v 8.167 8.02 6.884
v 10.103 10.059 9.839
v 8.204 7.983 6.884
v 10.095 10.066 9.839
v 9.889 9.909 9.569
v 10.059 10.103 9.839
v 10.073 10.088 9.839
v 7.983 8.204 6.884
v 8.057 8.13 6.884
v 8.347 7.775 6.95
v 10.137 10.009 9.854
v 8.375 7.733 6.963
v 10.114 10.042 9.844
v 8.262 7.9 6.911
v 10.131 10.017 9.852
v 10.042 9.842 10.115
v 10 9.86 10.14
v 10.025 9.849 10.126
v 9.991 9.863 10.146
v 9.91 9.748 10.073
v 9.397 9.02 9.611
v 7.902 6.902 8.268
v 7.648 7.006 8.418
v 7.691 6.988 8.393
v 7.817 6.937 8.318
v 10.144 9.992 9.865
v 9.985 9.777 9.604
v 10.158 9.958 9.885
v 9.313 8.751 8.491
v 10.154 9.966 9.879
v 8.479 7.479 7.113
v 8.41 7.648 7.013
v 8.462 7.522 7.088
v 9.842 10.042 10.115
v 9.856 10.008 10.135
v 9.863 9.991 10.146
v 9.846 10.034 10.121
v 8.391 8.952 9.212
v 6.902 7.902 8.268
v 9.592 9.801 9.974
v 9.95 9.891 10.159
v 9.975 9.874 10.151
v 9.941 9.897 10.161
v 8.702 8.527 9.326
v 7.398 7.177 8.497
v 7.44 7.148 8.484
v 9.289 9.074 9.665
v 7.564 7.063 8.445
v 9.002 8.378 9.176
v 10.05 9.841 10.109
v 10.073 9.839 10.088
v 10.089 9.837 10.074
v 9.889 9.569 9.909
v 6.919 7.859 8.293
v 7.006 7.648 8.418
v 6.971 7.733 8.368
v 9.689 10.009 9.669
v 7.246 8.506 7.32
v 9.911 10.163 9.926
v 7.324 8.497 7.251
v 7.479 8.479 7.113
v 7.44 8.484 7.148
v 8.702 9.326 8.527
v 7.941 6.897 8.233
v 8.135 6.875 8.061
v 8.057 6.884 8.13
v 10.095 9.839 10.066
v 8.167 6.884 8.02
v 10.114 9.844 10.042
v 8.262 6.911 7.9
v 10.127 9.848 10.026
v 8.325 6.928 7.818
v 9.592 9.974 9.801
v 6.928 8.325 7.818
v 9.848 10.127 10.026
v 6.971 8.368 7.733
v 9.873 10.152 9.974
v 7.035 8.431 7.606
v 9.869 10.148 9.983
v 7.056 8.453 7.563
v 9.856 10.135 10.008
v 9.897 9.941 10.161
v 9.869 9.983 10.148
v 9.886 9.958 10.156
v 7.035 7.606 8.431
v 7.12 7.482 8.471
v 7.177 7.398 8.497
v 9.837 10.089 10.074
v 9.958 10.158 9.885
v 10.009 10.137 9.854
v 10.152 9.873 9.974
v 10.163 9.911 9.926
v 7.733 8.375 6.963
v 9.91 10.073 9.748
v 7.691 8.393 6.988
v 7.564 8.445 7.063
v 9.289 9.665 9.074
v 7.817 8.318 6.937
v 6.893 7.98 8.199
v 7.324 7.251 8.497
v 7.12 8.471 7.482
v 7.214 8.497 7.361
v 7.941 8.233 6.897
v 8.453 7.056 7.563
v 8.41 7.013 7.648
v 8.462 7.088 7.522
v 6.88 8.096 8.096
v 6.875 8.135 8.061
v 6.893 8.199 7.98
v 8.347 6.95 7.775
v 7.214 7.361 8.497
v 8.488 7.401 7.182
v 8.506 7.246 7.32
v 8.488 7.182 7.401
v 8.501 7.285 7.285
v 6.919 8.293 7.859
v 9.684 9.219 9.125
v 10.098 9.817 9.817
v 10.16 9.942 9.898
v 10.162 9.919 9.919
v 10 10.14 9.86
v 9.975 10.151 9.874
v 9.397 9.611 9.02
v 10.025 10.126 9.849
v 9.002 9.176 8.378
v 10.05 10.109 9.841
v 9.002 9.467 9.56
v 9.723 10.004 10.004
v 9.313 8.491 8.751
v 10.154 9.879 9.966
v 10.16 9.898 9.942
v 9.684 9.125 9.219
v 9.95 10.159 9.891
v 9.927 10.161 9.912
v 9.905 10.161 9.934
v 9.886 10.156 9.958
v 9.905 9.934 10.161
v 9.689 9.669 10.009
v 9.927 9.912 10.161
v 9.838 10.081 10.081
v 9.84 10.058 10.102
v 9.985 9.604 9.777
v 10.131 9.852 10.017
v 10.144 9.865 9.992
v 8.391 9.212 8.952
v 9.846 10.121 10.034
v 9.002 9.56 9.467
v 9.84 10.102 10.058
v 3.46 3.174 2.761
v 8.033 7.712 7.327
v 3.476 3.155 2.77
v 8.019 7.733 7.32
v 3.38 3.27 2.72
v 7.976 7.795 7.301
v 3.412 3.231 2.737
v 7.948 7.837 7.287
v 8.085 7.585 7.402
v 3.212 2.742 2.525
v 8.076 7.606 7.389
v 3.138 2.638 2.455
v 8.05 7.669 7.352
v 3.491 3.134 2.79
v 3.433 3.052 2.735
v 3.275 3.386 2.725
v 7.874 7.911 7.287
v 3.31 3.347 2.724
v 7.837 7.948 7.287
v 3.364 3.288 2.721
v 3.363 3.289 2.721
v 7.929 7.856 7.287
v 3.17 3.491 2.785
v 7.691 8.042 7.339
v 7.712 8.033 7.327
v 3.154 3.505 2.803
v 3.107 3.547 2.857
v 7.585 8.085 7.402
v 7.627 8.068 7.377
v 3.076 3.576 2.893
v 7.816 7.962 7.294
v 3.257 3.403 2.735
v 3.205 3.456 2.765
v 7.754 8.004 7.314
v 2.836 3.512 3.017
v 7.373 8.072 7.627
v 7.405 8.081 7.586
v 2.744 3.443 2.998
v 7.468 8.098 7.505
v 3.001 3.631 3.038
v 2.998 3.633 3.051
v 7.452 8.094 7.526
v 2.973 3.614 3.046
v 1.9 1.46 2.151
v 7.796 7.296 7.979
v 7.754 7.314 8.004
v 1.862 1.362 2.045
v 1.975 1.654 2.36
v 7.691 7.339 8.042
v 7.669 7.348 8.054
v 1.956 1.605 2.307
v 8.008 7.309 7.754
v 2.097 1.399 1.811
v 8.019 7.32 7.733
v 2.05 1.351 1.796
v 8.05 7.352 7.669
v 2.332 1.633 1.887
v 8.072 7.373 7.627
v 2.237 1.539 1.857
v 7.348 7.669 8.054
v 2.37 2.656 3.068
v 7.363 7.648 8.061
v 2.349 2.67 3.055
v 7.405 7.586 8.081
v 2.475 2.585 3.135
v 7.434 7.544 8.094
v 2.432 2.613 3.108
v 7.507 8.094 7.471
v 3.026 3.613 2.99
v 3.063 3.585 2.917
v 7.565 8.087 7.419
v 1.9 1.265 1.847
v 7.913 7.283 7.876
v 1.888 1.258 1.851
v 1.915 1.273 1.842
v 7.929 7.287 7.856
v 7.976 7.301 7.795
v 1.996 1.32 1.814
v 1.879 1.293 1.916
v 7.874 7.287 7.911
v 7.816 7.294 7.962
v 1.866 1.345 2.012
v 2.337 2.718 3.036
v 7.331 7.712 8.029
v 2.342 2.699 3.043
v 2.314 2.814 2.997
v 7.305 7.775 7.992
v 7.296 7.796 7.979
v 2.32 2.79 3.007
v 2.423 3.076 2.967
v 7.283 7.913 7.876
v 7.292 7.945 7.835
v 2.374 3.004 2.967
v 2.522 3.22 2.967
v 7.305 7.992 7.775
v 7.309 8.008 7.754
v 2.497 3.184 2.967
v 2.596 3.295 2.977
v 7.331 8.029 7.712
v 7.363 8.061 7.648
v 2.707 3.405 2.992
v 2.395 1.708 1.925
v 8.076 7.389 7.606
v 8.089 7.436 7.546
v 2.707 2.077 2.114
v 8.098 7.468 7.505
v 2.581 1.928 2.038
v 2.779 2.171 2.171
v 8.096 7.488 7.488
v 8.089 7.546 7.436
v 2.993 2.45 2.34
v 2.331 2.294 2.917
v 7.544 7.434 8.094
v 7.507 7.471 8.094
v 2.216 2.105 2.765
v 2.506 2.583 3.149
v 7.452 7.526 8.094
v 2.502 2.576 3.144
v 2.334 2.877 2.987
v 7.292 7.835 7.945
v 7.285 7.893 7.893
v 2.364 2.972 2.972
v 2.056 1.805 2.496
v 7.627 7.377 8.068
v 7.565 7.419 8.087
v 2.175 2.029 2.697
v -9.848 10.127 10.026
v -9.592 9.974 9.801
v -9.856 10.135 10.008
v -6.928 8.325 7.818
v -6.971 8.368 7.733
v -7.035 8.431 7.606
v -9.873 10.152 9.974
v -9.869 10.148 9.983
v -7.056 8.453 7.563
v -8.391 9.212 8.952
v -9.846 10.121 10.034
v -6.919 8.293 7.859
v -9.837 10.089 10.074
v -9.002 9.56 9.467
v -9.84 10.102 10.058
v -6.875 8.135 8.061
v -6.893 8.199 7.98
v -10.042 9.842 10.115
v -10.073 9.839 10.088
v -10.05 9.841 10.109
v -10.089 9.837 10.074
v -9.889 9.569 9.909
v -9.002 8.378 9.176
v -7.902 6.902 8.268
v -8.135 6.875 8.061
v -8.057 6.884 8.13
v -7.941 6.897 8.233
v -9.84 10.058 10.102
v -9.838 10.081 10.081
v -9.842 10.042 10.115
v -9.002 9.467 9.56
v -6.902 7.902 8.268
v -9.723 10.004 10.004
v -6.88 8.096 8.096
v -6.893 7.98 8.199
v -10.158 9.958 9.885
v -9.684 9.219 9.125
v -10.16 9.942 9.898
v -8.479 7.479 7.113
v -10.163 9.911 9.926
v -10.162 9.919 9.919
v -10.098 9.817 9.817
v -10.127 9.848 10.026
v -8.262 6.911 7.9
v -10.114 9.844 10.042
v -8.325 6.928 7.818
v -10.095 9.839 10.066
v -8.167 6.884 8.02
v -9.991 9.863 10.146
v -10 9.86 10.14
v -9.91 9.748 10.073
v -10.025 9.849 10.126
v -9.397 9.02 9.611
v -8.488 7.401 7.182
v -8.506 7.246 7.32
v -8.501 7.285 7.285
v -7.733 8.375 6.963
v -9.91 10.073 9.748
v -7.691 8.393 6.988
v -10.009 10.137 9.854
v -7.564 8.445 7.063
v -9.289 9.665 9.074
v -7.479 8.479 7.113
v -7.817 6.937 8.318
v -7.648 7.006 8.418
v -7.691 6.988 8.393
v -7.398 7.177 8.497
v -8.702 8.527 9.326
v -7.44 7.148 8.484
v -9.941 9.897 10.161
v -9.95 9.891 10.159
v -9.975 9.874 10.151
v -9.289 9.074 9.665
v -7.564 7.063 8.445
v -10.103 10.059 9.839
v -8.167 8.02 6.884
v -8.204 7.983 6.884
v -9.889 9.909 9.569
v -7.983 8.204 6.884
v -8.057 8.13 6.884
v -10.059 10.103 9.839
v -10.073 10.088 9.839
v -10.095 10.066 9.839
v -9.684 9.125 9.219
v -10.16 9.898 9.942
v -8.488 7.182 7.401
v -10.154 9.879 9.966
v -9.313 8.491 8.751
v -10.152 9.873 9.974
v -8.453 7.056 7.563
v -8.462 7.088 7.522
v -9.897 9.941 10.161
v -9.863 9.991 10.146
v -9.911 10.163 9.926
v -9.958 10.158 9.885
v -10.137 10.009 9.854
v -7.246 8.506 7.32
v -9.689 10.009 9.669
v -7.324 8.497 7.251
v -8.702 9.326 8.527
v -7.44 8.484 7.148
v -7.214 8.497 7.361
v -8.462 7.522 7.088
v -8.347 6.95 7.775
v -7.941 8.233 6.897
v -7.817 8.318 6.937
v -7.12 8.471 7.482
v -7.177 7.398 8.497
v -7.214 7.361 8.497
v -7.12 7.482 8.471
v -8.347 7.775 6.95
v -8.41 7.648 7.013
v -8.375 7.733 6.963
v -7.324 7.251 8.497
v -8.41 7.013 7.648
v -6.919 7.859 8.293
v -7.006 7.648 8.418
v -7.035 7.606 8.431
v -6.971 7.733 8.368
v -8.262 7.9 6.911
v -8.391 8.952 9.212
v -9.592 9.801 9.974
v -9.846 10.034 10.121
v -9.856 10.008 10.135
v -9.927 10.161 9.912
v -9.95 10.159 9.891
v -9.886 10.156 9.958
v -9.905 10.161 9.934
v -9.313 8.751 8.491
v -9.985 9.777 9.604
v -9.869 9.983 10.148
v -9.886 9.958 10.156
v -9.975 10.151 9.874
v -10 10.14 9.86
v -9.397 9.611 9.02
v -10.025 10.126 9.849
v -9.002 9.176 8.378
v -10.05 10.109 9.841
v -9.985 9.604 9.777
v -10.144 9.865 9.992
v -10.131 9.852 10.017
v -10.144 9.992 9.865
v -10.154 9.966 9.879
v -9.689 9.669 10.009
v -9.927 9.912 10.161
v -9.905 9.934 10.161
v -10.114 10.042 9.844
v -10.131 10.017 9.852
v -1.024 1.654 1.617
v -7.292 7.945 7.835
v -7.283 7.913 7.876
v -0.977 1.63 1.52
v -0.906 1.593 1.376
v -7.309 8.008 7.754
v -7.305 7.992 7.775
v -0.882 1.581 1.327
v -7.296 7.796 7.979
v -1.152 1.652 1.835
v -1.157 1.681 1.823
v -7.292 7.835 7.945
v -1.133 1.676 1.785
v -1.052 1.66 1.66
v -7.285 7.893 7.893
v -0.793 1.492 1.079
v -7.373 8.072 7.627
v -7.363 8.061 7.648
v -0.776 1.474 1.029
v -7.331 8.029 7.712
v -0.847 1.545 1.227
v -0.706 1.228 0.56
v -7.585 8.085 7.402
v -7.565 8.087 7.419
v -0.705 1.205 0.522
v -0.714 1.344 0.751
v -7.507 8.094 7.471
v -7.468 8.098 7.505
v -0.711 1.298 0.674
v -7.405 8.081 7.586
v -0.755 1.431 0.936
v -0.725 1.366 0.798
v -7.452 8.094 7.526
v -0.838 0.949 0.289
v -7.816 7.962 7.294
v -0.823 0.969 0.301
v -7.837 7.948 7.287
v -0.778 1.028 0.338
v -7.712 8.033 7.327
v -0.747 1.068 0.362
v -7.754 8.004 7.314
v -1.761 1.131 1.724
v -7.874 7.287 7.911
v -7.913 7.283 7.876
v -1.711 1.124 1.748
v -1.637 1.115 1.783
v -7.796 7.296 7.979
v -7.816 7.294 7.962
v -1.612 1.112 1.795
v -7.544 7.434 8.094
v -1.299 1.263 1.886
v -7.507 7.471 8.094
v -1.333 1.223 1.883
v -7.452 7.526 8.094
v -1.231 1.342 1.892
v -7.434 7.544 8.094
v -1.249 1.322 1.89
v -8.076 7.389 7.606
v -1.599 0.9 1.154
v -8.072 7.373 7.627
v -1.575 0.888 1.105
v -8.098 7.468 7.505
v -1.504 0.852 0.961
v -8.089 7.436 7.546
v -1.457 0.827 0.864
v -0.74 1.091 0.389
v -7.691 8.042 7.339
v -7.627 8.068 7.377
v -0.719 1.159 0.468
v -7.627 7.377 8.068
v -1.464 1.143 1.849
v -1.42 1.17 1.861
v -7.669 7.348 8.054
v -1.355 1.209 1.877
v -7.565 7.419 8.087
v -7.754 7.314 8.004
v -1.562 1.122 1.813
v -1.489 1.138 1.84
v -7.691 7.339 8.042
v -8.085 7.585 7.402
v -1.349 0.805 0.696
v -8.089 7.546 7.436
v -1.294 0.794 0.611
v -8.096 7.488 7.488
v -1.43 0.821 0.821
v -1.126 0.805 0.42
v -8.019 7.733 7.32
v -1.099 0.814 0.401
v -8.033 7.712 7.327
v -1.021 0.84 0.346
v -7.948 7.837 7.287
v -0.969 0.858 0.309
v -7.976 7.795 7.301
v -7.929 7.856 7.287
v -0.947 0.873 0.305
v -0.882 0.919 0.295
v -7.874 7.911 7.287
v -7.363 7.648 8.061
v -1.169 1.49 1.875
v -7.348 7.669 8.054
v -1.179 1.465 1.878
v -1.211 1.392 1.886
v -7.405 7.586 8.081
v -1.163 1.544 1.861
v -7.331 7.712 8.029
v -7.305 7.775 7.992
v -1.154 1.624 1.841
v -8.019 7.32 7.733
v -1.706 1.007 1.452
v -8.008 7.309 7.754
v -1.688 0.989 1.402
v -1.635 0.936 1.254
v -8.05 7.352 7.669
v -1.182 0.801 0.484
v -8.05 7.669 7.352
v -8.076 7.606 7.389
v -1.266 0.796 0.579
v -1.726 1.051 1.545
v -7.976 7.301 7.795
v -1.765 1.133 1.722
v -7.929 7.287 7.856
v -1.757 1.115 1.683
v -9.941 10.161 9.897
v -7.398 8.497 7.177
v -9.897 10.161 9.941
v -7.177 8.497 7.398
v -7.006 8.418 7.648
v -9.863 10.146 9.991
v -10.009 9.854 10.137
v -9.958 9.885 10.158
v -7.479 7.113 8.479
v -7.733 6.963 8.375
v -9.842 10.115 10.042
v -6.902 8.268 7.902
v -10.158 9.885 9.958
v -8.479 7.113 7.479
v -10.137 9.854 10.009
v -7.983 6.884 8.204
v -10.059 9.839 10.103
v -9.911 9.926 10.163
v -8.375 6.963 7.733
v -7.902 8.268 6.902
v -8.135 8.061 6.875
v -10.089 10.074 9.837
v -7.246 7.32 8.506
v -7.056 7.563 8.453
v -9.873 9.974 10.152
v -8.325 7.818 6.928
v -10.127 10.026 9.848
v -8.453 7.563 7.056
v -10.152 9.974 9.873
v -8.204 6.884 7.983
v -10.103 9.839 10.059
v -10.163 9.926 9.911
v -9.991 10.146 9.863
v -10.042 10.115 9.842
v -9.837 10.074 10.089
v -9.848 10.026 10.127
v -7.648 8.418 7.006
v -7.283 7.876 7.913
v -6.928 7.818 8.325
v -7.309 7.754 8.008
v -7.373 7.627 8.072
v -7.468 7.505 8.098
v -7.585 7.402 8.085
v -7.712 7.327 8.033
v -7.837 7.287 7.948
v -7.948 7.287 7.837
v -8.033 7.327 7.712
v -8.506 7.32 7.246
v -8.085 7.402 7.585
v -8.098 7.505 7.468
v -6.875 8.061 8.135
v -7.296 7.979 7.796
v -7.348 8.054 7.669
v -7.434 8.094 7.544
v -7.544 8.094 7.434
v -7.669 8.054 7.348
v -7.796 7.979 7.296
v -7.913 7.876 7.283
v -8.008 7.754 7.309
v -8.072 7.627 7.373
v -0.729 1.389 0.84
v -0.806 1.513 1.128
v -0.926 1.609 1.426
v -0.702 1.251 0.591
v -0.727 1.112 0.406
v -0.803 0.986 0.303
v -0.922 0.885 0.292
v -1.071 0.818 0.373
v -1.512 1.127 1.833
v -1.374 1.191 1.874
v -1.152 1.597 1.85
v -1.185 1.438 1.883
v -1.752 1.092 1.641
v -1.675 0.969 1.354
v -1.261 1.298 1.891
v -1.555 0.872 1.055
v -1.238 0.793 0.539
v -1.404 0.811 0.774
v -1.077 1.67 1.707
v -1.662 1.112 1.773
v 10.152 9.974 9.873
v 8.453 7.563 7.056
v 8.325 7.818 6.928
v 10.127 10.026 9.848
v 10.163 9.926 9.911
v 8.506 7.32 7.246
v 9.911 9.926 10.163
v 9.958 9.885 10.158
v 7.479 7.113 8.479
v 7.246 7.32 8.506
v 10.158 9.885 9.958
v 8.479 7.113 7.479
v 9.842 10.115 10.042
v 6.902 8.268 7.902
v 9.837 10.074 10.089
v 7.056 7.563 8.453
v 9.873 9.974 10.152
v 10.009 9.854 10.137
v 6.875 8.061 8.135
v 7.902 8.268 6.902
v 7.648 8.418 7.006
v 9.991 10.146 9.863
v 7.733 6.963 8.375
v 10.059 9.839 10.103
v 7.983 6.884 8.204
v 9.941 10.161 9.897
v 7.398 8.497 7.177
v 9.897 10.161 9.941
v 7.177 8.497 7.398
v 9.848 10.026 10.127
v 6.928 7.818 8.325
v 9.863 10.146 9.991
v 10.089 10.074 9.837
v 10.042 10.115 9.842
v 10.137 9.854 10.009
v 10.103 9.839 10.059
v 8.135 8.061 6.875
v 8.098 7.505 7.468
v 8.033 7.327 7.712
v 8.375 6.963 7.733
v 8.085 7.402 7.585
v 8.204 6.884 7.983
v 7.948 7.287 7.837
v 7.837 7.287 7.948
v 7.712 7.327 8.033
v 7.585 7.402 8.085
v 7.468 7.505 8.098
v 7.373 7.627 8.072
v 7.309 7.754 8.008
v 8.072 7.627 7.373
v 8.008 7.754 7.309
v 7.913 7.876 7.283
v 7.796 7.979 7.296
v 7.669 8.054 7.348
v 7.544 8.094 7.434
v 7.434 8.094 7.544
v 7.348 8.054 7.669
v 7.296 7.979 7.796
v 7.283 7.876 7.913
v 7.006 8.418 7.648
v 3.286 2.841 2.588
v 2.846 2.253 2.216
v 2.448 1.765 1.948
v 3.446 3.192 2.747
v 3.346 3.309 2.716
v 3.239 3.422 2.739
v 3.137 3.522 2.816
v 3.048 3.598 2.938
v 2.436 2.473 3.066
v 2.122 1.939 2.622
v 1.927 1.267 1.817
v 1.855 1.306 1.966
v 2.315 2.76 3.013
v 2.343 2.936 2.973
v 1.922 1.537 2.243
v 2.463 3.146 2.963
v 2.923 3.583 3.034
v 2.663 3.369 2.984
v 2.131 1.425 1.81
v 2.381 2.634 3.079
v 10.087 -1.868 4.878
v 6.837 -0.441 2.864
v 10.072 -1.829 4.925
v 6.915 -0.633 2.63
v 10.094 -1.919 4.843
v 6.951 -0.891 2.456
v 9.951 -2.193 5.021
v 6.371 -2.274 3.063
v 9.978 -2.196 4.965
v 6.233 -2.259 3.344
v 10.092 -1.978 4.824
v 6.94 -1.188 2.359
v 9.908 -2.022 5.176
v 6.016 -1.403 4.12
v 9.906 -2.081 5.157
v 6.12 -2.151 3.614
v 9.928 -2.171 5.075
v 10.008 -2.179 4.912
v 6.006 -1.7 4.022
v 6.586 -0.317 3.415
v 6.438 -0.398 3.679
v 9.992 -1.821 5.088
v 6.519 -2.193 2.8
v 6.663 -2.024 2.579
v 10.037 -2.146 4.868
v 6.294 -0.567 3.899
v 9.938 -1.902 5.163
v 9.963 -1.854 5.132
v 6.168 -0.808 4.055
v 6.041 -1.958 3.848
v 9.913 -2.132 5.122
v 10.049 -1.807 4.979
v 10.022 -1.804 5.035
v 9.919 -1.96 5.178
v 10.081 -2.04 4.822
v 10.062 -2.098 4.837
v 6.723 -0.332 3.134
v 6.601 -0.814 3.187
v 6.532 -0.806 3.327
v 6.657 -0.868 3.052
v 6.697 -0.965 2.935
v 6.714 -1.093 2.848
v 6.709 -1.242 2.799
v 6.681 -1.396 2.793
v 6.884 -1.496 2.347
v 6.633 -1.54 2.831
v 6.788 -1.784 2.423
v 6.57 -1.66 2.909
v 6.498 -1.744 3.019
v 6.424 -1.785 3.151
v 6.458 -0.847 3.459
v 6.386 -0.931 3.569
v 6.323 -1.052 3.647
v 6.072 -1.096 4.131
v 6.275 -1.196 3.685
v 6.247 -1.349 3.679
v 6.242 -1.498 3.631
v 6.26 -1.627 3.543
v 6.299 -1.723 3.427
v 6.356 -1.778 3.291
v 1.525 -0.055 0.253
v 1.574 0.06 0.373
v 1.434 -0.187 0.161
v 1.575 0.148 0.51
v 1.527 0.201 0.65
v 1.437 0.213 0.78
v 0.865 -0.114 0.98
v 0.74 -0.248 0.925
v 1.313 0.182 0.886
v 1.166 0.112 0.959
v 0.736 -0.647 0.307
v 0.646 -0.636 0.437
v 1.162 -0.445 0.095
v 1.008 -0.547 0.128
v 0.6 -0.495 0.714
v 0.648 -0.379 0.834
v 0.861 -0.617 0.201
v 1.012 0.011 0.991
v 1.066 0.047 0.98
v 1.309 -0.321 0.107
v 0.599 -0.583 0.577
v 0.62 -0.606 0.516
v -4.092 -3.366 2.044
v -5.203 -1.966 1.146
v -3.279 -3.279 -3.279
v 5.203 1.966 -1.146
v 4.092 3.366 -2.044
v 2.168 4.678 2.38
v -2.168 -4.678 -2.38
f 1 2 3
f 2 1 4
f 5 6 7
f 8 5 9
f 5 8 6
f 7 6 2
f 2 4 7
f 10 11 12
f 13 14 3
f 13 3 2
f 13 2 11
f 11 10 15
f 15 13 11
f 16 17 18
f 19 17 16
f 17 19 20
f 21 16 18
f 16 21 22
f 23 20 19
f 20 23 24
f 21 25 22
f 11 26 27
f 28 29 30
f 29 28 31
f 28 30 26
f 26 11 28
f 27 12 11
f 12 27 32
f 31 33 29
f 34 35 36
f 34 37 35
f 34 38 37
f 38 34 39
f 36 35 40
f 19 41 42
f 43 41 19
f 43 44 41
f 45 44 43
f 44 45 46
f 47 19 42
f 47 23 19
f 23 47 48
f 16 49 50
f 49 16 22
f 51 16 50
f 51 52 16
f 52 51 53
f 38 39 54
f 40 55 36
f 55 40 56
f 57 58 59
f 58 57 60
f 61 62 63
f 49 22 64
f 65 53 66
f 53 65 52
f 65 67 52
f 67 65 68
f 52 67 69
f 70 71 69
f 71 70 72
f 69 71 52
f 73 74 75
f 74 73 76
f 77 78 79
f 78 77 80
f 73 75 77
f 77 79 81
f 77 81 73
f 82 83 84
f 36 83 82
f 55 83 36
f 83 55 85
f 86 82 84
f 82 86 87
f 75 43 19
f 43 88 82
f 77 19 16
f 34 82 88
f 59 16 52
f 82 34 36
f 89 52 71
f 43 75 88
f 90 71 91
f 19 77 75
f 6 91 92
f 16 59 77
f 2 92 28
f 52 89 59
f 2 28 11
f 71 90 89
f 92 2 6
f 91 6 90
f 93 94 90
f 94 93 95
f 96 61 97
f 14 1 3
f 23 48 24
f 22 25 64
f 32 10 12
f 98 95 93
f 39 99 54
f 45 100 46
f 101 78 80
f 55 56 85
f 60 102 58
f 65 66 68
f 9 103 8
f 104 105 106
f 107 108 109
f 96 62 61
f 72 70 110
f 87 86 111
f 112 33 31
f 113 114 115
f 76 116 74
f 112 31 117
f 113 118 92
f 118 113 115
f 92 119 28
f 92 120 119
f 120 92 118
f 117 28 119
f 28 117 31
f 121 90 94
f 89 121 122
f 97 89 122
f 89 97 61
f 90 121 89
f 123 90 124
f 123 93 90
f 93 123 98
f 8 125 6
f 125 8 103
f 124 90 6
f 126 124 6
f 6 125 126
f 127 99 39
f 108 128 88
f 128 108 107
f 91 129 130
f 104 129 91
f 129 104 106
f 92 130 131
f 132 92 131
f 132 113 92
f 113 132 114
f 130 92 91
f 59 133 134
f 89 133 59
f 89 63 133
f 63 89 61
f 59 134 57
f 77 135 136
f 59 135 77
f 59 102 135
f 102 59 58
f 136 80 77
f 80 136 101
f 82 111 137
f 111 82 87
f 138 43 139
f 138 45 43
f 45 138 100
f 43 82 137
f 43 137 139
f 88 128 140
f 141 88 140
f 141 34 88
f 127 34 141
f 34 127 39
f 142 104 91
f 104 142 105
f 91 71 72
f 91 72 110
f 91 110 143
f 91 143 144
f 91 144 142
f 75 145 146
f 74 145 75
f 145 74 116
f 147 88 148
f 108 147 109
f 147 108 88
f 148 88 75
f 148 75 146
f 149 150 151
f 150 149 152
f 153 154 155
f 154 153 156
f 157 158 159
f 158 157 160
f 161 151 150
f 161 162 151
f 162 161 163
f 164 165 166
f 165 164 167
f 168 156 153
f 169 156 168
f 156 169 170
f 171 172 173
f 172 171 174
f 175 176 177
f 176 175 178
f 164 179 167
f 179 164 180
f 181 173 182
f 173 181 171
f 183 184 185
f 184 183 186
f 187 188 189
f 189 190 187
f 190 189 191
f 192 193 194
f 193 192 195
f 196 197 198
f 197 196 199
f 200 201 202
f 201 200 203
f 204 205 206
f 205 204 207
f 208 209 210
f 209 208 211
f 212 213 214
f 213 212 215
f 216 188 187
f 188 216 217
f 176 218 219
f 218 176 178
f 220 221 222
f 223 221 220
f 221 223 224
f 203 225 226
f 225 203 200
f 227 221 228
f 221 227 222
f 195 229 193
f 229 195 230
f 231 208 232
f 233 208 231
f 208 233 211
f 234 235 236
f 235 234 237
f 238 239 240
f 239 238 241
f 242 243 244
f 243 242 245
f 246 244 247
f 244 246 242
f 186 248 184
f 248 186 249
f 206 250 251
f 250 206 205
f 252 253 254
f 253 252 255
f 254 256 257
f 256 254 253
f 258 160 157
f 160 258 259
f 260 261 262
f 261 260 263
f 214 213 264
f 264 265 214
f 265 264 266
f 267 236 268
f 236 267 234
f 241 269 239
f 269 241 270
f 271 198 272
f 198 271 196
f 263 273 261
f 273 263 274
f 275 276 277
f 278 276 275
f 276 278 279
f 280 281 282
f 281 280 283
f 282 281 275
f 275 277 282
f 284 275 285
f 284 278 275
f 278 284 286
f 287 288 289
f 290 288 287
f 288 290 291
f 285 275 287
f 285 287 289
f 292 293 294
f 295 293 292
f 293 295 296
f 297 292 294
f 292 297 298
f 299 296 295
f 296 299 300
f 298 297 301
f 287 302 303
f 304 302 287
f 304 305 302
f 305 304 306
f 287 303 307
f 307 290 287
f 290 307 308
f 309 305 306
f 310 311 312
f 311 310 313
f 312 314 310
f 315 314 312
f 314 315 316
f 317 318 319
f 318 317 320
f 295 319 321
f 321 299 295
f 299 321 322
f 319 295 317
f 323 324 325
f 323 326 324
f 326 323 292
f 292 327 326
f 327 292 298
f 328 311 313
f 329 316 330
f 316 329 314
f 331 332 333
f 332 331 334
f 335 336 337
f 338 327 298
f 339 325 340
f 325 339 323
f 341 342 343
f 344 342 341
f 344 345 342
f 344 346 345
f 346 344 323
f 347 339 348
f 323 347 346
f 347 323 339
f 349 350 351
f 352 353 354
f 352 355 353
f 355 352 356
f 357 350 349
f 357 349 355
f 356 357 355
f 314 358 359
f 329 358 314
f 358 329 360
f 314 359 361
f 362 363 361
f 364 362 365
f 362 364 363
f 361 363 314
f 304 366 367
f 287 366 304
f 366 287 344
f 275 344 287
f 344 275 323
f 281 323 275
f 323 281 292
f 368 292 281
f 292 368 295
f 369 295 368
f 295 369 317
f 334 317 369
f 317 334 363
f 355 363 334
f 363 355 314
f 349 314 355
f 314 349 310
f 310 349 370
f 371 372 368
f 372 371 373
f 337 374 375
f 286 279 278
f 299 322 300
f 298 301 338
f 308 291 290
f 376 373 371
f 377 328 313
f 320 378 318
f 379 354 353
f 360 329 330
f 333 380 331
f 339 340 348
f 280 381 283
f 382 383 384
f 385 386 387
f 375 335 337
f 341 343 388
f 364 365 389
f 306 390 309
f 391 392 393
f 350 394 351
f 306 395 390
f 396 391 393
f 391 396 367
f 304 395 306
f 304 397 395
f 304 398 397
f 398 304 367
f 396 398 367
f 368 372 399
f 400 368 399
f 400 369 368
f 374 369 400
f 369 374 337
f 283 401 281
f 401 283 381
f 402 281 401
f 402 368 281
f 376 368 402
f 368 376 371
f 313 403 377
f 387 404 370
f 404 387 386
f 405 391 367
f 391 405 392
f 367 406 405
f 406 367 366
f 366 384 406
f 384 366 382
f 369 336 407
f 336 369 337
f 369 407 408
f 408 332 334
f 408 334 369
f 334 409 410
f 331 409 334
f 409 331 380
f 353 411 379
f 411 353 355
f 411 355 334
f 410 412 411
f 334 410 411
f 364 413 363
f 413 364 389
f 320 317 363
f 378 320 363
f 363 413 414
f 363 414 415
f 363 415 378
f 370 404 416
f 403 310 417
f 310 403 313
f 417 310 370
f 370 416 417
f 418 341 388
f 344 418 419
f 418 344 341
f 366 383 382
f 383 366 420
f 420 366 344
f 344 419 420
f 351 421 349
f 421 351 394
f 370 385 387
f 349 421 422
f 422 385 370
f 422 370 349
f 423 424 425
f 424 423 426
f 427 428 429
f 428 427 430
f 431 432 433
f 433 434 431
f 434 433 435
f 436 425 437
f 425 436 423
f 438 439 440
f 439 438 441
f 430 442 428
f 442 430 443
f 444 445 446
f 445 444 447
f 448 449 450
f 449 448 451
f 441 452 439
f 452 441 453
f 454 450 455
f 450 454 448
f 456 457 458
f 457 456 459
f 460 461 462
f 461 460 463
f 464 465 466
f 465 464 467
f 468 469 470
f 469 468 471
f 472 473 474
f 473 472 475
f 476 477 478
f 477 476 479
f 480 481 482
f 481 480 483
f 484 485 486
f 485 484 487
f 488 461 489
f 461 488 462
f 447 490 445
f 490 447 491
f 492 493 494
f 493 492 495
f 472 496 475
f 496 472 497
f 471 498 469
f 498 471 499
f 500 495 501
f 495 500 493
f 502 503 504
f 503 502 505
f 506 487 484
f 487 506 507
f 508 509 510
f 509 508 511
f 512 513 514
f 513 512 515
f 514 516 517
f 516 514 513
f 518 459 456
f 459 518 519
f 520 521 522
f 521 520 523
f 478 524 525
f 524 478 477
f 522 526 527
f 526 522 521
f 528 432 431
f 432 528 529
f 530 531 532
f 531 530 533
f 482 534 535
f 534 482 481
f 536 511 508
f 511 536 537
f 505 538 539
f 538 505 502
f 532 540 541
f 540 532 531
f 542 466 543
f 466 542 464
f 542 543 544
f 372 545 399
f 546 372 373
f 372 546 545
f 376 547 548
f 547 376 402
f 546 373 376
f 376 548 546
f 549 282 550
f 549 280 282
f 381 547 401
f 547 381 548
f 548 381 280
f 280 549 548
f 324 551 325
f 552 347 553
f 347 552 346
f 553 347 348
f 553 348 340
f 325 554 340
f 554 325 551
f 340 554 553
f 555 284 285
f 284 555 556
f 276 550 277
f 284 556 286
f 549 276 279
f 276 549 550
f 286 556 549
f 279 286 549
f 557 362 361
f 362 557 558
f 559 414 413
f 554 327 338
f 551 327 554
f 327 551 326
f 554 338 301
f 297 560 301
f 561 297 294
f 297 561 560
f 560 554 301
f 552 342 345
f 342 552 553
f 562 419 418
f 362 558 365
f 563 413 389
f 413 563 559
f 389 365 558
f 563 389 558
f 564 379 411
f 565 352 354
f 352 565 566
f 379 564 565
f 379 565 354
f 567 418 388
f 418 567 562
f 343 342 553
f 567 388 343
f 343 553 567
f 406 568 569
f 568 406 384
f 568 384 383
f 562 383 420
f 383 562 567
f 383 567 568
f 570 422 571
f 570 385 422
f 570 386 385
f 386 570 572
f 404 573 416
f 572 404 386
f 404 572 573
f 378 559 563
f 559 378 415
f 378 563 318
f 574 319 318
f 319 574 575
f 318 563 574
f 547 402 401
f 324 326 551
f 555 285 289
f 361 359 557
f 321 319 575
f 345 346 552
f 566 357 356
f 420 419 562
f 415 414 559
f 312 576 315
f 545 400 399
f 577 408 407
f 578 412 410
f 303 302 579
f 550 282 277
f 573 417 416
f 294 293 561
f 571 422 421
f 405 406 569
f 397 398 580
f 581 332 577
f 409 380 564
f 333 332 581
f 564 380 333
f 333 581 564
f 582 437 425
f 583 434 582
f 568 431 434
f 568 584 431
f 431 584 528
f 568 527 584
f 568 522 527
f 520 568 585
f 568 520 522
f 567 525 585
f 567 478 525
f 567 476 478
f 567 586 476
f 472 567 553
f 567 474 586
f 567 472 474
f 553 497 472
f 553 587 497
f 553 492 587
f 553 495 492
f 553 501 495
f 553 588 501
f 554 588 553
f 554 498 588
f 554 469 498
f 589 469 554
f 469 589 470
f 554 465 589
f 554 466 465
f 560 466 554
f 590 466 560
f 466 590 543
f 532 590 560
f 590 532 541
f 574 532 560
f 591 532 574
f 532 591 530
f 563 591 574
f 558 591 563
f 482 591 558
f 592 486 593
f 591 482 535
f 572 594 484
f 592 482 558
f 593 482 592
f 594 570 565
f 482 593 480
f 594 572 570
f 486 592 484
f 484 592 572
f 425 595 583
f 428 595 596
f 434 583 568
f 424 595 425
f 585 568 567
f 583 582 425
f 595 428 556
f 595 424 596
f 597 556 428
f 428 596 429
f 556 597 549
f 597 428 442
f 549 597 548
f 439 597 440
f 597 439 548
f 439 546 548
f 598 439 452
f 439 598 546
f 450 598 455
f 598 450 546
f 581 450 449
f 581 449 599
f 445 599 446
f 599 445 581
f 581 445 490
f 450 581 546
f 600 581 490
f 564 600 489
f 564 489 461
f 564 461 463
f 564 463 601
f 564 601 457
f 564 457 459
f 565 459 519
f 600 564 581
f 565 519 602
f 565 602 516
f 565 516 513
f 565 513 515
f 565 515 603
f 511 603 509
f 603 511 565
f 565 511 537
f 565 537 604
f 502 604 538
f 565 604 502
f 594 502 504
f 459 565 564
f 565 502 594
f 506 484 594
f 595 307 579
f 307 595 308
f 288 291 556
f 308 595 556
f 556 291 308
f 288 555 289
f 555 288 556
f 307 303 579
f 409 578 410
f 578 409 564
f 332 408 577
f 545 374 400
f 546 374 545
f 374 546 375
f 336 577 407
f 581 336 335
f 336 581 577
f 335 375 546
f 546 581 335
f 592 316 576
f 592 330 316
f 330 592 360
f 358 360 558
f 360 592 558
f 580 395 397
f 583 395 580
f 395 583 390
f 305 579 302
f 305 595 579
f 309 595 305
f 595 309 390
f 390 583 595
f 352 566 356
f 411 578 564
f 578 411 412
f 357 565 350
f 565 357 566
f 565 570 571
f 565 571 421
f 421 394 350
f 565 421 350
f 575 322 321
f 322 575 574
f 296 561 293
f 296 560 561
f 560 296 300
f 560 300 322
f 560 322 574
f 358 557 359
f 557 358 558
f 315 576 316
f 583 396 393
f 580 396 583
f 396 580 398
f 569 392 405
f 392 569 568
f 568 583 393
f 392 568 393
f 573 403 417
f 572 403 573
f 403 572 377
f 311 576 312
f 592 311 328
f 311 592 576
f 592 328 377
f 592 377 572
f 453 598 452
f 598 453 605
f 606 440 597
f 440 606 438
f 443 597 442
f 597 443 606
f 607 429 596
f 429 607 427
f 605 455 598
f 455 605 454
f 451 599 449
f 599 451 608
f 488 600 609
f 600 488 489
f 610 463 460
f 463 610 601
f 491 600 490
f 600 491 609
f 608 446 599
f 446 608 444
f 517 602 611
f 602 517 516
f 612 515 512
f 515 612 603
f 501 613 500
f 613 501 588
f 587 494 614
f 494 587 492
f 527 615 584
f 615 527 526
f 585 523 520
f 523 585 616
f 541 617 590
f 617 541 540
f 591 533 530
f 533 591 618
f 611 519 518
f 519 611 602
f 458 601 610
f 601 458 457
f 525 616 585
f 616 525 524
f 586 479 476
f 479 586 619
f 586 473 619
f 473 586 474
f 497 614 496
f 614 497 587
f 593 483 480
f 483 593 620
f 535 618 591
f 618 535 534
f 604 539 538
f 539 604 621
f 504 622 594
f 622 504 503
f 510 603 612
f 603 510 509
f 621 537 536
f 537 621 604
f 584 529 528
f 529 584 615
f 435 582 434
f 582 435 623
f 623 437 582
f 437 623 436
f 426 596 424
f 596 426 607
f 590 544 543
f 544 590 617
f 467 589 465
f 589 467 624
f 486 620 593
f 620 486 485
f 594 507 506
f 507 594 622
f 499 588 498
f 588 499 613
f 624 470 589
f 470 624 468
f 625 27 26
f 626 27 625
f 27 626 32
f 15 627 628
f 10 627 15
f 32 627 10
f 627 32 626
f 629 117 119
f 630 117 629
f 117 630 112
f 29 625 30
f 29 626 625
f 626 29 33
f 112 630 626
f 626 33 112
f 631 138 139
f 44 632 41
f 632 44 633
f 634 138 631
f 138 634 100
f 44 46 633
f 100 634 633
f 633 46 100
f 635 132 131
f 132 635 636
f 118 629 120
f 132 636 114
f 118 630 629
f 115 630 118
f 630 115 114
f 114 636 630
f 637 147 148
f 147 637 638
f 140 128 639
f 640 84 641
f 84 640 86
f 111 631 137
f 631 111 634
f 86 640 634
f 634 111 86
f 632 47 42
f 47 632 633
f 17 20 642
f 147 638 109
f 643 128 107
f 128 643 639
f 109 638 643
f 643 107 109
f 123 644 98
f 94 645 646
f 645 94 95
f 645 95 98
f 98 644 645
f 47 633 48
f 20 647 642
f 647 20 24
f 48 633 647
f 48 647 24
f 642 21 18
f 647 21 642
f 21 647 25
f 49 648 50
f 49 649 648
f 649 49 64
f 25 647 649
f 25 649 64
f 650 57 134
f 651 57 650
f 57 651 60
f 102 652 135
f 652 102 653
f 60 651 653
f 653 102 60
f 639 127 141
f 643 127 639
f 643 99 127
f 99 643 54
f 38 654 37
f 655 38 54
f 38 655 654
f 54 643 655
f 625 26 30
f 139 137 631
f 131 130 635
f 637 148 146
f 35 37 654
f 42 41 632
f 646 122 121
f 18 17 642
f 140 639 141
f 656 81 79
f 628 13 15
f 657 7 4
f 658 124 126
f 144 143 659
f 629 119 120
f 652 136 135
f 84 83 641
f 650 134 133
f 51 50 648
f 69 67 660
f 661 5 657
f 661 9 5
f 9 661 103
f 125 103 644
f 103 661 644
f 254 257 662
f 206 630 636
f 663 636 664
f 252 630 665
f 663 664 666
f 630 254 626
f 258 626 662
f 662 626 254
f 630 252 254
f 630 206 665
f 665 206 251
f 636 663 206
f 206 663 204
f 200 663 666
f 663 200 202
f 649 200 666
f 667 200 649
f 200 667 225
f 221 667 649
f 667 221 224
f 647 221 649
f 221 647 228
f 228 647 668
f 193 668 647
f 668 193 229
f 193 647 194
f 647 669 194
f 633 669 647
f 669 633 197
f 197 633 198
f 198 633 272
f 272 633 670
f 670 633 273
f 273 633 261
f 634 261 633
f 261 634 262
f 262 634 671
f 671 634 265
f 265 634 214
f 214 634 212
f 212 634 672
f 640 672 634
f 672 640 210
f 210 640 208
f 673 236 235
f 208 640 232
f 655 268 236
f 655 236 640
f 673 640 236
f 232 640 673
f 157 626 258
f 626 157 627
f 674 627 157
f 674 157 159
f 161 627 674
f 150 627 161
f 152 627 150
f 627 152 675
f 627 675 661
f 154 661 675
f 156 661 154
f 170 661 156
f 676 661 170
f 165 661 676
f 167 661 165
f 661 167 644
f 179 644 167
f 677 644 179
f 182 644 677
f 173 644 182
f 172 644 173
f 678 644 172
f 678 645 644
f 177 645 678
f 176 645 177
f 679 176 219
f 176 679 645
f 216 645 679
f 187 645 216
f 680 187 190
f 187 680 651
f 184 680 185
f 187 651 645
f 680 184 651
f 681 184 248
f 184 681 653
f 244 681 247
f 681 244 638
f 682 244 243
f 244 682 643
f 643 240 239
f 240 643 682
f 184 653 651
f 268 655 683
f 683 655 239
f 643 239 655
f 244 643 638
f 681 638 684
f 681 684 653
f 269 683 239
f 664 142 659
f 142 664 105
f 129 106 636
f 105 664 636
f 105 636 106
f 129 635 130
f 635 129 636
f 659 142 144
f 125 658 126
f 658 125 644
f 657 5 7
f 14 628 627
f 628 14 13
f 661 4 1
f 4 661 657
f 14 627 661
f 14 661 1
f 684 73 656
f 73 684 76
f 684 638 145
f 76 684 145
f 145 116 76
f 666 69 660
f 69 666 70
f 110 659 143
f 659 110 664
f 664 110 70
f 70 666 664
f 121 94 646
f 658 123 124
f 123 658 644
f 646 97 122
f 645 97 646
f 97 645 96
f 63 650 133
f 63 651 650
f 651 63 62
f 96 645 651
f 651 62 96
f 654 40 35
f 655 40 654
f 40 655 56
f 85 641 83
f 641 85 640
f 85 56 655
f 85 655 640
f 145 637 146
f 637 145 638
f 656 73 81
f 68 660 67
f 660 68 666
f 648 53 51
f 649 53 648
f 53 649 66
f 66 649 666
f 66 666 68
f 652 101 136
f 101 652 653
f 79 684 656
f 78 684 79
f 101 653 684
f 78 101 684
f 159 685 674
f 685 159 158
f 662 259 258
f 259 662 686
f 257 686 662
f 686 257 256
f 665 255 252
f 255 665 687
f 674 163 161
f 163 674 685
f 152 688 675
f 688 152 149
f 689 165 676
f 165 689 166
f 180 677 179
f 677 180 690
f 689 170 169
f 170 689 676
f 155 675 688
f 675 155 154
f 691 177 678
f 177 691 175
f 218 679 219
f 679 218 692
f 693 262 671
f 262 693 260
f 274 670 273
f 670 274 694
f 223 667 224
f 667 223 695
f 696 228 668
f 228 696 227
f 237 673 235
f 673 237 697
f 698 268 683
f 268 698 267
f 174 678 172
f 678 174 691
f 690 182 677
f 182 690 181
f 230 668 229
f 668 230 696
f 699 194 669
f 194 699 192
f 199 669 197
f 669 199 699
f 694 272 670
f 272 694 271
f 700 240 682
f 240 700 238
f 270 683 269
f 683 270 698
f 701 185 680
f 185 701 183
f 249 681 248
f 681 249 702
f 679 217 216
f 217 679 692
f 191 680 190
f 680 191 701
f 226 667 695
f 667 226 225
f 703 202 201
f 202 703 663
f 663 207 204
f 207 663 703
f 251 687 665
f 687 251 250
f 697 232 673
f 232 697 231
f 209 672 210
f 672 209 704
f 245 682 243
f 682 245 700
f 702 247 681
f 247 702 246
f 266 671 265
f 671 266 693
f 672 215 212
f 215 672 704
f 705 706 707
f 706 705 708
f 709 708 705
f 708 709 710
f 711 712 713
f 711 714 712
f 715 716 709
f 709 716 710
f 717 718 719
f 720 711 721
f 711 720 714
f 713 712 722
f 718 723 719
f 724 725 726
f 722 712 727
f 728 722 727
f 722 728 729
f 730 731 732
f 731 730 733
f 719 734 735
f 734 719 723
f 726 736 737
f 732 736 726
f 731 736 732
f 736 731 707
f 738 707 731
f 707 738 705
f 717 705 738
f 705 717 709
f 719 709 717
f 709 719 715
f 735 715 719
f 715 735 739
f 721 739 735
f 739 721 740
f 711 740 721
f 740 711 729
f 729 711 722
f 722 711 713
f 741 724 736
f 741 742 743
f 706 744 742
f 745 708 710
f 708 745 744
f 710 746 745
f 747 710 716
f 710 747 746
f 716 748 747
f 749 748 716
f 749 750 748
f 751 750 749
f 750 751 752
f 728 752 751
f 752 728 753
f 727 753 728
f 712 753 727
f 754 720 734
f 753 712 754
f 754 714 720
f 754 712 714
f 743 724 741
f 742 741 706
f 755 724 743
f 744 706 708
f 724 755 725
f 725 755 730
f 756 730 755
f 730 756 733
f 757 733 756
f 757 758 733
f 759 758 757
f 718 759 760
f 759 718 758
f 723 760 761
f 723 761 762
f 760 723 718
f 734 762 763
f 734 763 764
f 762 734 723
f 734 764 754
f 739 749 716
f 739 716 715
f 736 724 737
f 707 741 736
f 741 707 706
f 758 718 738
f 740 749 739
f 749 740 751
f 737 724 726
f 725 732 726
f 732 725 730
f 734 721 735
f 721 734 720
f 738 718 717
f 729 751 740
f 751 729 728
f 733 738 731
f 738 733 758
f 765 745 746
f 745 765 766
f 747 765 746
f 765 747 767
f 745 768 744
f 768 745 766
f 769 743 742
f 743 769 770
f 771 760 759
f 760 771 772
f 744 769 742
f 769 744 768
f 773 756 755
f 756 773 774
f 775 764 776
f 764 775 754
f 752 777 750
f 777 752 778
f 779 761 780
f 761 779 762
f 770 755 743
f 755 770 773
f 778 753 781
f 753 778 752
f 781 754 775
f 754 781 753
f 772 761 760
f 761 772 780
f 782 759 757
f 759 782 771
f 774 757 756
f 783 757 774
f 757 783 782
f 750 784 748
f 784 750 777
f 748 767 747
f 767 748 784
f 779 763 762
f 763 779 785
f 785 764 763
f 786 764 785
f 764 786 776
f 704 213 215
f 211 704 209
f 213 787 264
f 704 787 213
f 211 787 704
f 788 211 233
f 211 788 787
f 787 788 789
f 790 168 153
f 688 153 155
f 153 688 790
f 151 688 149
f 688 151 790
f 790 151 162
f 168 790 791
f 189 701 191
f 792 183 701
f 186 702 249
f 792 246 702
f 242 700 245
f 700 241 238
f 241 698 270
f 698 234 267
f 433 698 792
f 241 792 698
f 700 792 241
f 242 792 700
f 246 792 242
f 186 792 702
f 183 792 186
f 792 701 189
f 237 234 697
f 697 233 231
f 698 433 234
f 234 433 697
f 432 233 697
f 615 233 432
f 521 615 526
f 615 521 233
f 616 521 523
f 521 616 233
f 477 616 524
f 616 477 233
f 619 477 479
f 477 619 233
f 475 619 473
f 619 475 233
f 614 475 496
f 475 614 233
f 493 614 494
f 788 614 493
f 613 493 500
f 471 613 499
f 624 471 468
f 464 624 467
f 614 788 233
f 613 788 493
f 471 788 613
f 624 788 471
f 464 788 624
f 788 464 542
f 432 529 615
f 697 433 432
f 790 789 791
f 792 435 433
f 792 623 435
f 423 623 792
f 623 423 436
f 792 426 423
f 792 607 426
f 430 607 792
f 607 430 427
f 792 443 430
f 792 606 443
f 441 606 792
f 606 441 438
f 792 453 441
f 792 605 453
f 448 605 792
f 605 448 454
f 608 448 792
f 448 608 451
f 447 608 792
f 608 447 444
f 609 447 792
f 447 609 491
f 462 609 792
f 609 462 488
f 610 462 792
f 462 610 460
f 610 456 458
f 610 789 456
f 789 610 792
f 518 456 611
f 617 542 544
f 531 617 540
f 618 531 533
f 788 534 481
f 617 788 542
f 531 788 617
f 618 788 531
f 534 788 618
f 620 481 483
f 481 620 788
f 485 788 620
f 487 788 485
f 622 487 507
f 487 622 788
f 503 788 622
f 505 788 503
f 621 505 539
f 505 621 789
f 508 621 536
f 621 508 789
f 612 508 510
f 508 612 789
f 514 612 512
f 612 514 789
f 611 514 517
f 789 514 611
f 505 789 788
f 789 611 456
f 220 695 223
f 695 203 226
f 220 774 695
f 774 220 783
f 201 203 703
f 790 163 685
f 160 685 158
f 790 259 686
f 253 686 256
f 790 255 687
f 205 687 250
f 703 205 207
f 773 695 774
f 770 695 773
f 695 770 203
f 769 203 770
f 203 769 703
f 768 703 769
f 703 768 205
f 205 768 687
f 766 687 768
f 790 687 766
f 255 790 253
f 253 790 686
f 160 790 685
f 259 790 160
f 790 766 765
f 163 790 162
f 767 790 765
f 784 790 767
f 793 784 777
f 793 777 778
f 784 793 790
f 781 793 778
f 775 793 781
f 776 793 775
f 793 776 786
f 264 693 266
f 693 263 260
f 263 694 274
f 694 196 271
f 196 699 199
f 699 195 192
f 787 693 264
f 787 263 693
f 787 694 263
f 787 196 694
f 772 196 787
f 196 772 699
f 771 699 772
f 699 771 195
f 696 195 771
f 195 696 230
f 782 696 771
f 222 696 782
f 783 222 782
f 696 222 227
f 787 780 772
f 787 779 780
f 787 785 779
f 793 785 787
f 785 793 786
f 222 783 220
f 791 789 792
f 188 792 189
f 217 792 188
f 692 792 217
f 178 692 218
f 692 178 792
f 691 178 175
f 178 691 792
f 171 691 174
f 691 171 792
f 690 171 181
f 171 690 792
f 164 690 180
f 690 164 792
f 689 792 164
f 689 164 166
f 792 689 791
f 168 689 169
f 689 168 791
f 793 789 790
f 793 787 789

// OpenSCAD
//---------------------------------------------------------------
//-- Openscad vector library
//-- This is a component of the obiscad opescad tools by Obijuan
//-- (C) Juan Gonzalez-Gomez (Obijuan)
//-- Sep-2012
//---------------------------------------------------------------
//-- Released under the GPL license
//---------------------------------------------------------------

//----------------------------------------
//-- FUNCTIONS FOR WORKING WITH VECTORS
//----------------------------------------

//-- Calculate the module of a vector
function mod(v) = (sqrt(v[0]*v[0]+v[1]*v[1]+v[2]*v[2]));

//-- Calculate the cros product of two vectors
function cross(u,v) = [
  u[1]*v[2] - v[1]*u[2],
  -(u[0]*v[2] - v[0]*u[2]) ,
  u[0]*v[1] - v[0]*u[1]];

//-- Calculate the dot product of two vectors
function dot(u,v) = u[0]*v[0]+u[1]*v[1]+u[2]*v[2];

//-- Return the unit vector of a vector
function unitv(v) = v/mod(v);

//-- Return the angle between two vectores
function anglev(u,v) = acos( dot(u,v) / (mod(u)*mod(v)) );

//----------------------------------------------------------
//--  Draw a point in the position given by the vector p  
//----------------------------------------------------------
module point(p)
{
  translate(p)
    sphere(r=0.7,$fn=20);
}

//------------------------------------------------------------------
//-- Draw a vector poiting to the z axis
//-- This is an auxiliary module for implementing the vector module
//--
//-- Parameters:
//--  l: total vector length (line + arrow)
//--  l_arrow: Vector arrow length
//--  mark: If true, a mark is draw in the vector head, for having
//--    a visual reference of the rolling angle
//------------------------------------------------------------------
module vectorz(l=10, l_arrow=4, mark=false)
{
  //-- vector body length (not including the arrow)
  lb = l - l_arrow;

  //-- The vector is locatead at 0,0,0
  translate([0,0,lb/2])
  union() {

    //-- Draw the arrow
    translate([0,0,lb/2])
      cylinder(r1=2/2, r2=0.2, h=l_arrow, $fn=20);

    //-- Draw the mark
    if (mark) {
      translate([0,0,lb/2+l_arrow/2])
      translate([1,0,0])
        cube([2,0.3,l_arrow*0.8],center=true);
    }

    //-- Draw the body
    cylinder(r=1/2, h=lb, center=true, $fn=20);
  }

  //-- Draw a sphere in the vector base
  sphere(r=1/2, $fn=20);
}

//-----------------------------------------------------------------
//-- ORIENTATE OPERATOR
//--
//--  Orientate an object to the direction given by the vector v
//--  Parameters:
//--    v : Target orientation
//--    vref: Vector reference. It is the vector of the local frame
//--          of the object that want to be poiting in the direction
//--          of v
//--    roll: Rotation of the object around the v axis
//-------------------------------------------------------------------
module orientate(v,vref=[0,0,1], roll=0)
{
  //-- Calculate the rotation axis
  raxis = v[0]==vref[0] && v[1]==vref[1] ? [0,1,0] : cross(vref,v);
  
  //-- Calculate the angle between the vectors
  ang = anglev(vref,v);

  //-- Rotate the child!
  rotate(a=roll, v=v)
    rotate(a=ang, v=raxis)
      child(0);
}

module orientate2(v,vref=[0,0,1], roll=0)
{
  //-- Calculate the rotation axis
  raxis = cross(vref,v);
  
  //-- Calculate the angle between the vectors
  ang = anglev(vref,v);

  //-- Rotate the child!
  rotate(a=roll, v=v)
    rotate(a=ang, v=raxis)
      child(0);
}

//---------------------------------------------------------------------------
//-- Draw a vector 
//--
//-- There are two modes of drawing the vector
//-- * Mode 1: Given by a cartesian point(x,y,z). A vector from the origin
//--           to the end (x,y,z) is drawn. The l parameter (length) must 
//--           be 0  (l=0)
//-- * Mode 2: Give by direction and length
//--           A vector of length l pointing to the direction given by
//--           v is drawn
//---------------------------------------------------------------------------
//-- Parameters:
//--  v: Vector cartesian coordinates
//--  l: total vector length (line + arrow)
//--  l_arrow: Vector arrow length
//    mark: If true, a mark is draw in the vector head, for having
//--    a visual reference of the rolling angle
//---------------------------------------------------------------------------
module vector(v,l=0, l_arrow=4, mark=false)
{
  //-- Get the vector length from the coordinates
  mod = mod(v);

  //-- The vector is very easy implemented by means of the orientate
  //-- operator:
  //--  orientate(v) vectorz(l=mod, l_arrow=l_arrow)
  //--  BUT... in OPENSCAD 2012.02.22 the recursion does not
  //--    not work, so that if the user use the orientate operator
  //--    on a vector, openscad will ignore it..
  //-- The solution at the moment (I hope the openscad developers
  //--  implement the recursion in the near future...)
  //--  is to repite the orientate operation in this module

  //---- SAME CALCULATIONS THAN THE ORIENTATE OPERATOR!
  //-- Calculate the rotation axis

  vref = [0,0,1];
  raxis = cross(vref,v);
  
  //-- Calculate the angle between the vectors
  ang = anglev(vref,v);

  //-- orientate the vector
  //-- Draw the vector. The vector length is given either
  //--- by the mod variable (when l=0) or by l (when l!=0)
  if (l==0)
    rotate(a=ang, v=raxis)
      vectorz(l=mod, l_arrow=l_arrow, mark=mark);
  else
    rotate(a=ang, v=raxis)
      vectorz(l=l, l_arrow=l_arrow, mark=mark);

}

//----------------------------------------------------
//-- Draw a Frame of reference
//-- Parameters:
//-- l: length of the Unit vectors
//-----------------------------------------------------
module frame(l=10, l_arrow=4)
{

  //-- Z unit vector
  color("Blue")
    vector([0,0,l], l_arrow=l_arrow);

  //-- X unit vector
  color("Red")
    vector([l,0,0], l_arrow=l_arrow );

  //-- Y unit vector
  color("Green")
    vector([0,l,0],l_arrow=l_arrow);

  //-- Origin
  color("Gray")
    sphere(r=1, $fn=20);
}

//--------------------------------------------------
//-- Modules for testings and examples
//-- Testing that the vector library is working ok
//--------------------------------------------------

//-- 22 vectors in total are drawn, poiting to different directions
module Test_vectors1()
{

  a = 20;
  k = 1;

  //--  Add a frame of reference (in the origin)
  frame(l=a);

  //-- Negative vectors, pointing towards the three axis: -x, -y, -z
  color("Red")   vector([-a, 0,  0]);
  color("Green") vector([0, -a,  0]);
  color("Blue")  vector([0,  0, -a]);

  //-- It is *not* has been implemented using a for loop on purpose
  //-- This way, individual vectors can be commented out or highlighted

  //-- vectors with positive z
  vector([a,   a, a*k]);
  vector([0,   a, a*k]);
  vector([-a,  a, a*k]);
  vector([-a,  0, a*k]);

  vector([-a, -a, a*k]);
  vector([0,  -a, a*k]);
  vector([a,  -a, a*k]);
  vector([a,   0, a*k]);


  //-- Vectors with negative z
  vector([a,   a, -a*k]);
  vector([0,   a, -a*k]);
  vector([-a,  a, -a*k]);
  vector([-a,  0, -a*k]);

  vector([-a, -a, -a*k]);
  vector([0,  -a, -a*k]);
  vector([a,  -a, -a*k]);
  vector([a,   0, -a*k]);
}

//--- Another test...
module Test_vectors2()
{

  //-- Add the vector into the vector table
  //-- This vectors are taken as directions
  //-- All the vectors will be drawn with the same length (l)
  vector_table = [
    [1,   1, 1],
    [0,   1, 1],
    [-1,  1, 1],
    [-1,  0, 1],
    [-1, -1, 1],
    [0,  -1, 1],
    [1,  -1, 1],
    [1,   0, 1],
  
    [1,   1, -1],
    [0,   1, -1],
    [-1,  1, -1],
    [-1,  0, -1],
    [-1, -1, -1],
    [0,  -1, -1],
    [1,  -1, -1],
    [1,   0, -1],
  ];

  //-- Vector length
  l=20;

  frame(l=10);

  //-- Draw all the vector given in the table
  //-- The vectors point to the direction given in the table
  //-- They all are drawn with a length equal to l
  for (v=vector_table) {
    //-- Vector given by direction and length
    vector(v,l=l);
  }
}


//-- Test the cross product and the angle
//-- between vectors
module Test_vector3()
{
  //-- Start with 2 unit vectors
  v=unitv([1,1,1]);
  u=unitv([0,1,0]);

  //-- Draw the vector in different colors
  //-- Increase the length for drawing
  color("Red") vector(v*20);
  color("blue") vector(u*20);

  //-- Get the cross product
  w = cross(v,u);
  vector(w*20);

  //-- The cross product is NOT conmutative... 
  //-- change the order of v and u
  w2 = cross(u,v);
  vector(w2*20);

  //-- w should be perpendicular to v and u
  //-- Calculate the angles between them:
  echo("U , V: ", anglev(u,v));
  echo("W , U: ", anglev(w,u));
  echo("W , V: ", anglev(w,v));

}

//-- Test the orientate operator
module Test_vector4()
{
  o = [10,10,10];
  v = [-10,10,10];

  color("Red") vector(o);
  color("Blue") vector(v);

  //-- Orientate the vector o in the direction of v
  orientate(v,o)
    vector(o);

  //-- Inverse operation: orientate the v vector in the direction
  //-- of o
  orientate(o,v)
    vector(v);

  //-- Example of orientation of a cube
  orientate(o,vref=[10,-2,5],roll=0)
    cube([10,2,5],center=true);

  vector([10,-2,5]);

}

//-------- Perform tests......

Test_vector4();


/*

Test_vectors1();


translate([60,0,0]) 
  Test_vectors2();
*/
